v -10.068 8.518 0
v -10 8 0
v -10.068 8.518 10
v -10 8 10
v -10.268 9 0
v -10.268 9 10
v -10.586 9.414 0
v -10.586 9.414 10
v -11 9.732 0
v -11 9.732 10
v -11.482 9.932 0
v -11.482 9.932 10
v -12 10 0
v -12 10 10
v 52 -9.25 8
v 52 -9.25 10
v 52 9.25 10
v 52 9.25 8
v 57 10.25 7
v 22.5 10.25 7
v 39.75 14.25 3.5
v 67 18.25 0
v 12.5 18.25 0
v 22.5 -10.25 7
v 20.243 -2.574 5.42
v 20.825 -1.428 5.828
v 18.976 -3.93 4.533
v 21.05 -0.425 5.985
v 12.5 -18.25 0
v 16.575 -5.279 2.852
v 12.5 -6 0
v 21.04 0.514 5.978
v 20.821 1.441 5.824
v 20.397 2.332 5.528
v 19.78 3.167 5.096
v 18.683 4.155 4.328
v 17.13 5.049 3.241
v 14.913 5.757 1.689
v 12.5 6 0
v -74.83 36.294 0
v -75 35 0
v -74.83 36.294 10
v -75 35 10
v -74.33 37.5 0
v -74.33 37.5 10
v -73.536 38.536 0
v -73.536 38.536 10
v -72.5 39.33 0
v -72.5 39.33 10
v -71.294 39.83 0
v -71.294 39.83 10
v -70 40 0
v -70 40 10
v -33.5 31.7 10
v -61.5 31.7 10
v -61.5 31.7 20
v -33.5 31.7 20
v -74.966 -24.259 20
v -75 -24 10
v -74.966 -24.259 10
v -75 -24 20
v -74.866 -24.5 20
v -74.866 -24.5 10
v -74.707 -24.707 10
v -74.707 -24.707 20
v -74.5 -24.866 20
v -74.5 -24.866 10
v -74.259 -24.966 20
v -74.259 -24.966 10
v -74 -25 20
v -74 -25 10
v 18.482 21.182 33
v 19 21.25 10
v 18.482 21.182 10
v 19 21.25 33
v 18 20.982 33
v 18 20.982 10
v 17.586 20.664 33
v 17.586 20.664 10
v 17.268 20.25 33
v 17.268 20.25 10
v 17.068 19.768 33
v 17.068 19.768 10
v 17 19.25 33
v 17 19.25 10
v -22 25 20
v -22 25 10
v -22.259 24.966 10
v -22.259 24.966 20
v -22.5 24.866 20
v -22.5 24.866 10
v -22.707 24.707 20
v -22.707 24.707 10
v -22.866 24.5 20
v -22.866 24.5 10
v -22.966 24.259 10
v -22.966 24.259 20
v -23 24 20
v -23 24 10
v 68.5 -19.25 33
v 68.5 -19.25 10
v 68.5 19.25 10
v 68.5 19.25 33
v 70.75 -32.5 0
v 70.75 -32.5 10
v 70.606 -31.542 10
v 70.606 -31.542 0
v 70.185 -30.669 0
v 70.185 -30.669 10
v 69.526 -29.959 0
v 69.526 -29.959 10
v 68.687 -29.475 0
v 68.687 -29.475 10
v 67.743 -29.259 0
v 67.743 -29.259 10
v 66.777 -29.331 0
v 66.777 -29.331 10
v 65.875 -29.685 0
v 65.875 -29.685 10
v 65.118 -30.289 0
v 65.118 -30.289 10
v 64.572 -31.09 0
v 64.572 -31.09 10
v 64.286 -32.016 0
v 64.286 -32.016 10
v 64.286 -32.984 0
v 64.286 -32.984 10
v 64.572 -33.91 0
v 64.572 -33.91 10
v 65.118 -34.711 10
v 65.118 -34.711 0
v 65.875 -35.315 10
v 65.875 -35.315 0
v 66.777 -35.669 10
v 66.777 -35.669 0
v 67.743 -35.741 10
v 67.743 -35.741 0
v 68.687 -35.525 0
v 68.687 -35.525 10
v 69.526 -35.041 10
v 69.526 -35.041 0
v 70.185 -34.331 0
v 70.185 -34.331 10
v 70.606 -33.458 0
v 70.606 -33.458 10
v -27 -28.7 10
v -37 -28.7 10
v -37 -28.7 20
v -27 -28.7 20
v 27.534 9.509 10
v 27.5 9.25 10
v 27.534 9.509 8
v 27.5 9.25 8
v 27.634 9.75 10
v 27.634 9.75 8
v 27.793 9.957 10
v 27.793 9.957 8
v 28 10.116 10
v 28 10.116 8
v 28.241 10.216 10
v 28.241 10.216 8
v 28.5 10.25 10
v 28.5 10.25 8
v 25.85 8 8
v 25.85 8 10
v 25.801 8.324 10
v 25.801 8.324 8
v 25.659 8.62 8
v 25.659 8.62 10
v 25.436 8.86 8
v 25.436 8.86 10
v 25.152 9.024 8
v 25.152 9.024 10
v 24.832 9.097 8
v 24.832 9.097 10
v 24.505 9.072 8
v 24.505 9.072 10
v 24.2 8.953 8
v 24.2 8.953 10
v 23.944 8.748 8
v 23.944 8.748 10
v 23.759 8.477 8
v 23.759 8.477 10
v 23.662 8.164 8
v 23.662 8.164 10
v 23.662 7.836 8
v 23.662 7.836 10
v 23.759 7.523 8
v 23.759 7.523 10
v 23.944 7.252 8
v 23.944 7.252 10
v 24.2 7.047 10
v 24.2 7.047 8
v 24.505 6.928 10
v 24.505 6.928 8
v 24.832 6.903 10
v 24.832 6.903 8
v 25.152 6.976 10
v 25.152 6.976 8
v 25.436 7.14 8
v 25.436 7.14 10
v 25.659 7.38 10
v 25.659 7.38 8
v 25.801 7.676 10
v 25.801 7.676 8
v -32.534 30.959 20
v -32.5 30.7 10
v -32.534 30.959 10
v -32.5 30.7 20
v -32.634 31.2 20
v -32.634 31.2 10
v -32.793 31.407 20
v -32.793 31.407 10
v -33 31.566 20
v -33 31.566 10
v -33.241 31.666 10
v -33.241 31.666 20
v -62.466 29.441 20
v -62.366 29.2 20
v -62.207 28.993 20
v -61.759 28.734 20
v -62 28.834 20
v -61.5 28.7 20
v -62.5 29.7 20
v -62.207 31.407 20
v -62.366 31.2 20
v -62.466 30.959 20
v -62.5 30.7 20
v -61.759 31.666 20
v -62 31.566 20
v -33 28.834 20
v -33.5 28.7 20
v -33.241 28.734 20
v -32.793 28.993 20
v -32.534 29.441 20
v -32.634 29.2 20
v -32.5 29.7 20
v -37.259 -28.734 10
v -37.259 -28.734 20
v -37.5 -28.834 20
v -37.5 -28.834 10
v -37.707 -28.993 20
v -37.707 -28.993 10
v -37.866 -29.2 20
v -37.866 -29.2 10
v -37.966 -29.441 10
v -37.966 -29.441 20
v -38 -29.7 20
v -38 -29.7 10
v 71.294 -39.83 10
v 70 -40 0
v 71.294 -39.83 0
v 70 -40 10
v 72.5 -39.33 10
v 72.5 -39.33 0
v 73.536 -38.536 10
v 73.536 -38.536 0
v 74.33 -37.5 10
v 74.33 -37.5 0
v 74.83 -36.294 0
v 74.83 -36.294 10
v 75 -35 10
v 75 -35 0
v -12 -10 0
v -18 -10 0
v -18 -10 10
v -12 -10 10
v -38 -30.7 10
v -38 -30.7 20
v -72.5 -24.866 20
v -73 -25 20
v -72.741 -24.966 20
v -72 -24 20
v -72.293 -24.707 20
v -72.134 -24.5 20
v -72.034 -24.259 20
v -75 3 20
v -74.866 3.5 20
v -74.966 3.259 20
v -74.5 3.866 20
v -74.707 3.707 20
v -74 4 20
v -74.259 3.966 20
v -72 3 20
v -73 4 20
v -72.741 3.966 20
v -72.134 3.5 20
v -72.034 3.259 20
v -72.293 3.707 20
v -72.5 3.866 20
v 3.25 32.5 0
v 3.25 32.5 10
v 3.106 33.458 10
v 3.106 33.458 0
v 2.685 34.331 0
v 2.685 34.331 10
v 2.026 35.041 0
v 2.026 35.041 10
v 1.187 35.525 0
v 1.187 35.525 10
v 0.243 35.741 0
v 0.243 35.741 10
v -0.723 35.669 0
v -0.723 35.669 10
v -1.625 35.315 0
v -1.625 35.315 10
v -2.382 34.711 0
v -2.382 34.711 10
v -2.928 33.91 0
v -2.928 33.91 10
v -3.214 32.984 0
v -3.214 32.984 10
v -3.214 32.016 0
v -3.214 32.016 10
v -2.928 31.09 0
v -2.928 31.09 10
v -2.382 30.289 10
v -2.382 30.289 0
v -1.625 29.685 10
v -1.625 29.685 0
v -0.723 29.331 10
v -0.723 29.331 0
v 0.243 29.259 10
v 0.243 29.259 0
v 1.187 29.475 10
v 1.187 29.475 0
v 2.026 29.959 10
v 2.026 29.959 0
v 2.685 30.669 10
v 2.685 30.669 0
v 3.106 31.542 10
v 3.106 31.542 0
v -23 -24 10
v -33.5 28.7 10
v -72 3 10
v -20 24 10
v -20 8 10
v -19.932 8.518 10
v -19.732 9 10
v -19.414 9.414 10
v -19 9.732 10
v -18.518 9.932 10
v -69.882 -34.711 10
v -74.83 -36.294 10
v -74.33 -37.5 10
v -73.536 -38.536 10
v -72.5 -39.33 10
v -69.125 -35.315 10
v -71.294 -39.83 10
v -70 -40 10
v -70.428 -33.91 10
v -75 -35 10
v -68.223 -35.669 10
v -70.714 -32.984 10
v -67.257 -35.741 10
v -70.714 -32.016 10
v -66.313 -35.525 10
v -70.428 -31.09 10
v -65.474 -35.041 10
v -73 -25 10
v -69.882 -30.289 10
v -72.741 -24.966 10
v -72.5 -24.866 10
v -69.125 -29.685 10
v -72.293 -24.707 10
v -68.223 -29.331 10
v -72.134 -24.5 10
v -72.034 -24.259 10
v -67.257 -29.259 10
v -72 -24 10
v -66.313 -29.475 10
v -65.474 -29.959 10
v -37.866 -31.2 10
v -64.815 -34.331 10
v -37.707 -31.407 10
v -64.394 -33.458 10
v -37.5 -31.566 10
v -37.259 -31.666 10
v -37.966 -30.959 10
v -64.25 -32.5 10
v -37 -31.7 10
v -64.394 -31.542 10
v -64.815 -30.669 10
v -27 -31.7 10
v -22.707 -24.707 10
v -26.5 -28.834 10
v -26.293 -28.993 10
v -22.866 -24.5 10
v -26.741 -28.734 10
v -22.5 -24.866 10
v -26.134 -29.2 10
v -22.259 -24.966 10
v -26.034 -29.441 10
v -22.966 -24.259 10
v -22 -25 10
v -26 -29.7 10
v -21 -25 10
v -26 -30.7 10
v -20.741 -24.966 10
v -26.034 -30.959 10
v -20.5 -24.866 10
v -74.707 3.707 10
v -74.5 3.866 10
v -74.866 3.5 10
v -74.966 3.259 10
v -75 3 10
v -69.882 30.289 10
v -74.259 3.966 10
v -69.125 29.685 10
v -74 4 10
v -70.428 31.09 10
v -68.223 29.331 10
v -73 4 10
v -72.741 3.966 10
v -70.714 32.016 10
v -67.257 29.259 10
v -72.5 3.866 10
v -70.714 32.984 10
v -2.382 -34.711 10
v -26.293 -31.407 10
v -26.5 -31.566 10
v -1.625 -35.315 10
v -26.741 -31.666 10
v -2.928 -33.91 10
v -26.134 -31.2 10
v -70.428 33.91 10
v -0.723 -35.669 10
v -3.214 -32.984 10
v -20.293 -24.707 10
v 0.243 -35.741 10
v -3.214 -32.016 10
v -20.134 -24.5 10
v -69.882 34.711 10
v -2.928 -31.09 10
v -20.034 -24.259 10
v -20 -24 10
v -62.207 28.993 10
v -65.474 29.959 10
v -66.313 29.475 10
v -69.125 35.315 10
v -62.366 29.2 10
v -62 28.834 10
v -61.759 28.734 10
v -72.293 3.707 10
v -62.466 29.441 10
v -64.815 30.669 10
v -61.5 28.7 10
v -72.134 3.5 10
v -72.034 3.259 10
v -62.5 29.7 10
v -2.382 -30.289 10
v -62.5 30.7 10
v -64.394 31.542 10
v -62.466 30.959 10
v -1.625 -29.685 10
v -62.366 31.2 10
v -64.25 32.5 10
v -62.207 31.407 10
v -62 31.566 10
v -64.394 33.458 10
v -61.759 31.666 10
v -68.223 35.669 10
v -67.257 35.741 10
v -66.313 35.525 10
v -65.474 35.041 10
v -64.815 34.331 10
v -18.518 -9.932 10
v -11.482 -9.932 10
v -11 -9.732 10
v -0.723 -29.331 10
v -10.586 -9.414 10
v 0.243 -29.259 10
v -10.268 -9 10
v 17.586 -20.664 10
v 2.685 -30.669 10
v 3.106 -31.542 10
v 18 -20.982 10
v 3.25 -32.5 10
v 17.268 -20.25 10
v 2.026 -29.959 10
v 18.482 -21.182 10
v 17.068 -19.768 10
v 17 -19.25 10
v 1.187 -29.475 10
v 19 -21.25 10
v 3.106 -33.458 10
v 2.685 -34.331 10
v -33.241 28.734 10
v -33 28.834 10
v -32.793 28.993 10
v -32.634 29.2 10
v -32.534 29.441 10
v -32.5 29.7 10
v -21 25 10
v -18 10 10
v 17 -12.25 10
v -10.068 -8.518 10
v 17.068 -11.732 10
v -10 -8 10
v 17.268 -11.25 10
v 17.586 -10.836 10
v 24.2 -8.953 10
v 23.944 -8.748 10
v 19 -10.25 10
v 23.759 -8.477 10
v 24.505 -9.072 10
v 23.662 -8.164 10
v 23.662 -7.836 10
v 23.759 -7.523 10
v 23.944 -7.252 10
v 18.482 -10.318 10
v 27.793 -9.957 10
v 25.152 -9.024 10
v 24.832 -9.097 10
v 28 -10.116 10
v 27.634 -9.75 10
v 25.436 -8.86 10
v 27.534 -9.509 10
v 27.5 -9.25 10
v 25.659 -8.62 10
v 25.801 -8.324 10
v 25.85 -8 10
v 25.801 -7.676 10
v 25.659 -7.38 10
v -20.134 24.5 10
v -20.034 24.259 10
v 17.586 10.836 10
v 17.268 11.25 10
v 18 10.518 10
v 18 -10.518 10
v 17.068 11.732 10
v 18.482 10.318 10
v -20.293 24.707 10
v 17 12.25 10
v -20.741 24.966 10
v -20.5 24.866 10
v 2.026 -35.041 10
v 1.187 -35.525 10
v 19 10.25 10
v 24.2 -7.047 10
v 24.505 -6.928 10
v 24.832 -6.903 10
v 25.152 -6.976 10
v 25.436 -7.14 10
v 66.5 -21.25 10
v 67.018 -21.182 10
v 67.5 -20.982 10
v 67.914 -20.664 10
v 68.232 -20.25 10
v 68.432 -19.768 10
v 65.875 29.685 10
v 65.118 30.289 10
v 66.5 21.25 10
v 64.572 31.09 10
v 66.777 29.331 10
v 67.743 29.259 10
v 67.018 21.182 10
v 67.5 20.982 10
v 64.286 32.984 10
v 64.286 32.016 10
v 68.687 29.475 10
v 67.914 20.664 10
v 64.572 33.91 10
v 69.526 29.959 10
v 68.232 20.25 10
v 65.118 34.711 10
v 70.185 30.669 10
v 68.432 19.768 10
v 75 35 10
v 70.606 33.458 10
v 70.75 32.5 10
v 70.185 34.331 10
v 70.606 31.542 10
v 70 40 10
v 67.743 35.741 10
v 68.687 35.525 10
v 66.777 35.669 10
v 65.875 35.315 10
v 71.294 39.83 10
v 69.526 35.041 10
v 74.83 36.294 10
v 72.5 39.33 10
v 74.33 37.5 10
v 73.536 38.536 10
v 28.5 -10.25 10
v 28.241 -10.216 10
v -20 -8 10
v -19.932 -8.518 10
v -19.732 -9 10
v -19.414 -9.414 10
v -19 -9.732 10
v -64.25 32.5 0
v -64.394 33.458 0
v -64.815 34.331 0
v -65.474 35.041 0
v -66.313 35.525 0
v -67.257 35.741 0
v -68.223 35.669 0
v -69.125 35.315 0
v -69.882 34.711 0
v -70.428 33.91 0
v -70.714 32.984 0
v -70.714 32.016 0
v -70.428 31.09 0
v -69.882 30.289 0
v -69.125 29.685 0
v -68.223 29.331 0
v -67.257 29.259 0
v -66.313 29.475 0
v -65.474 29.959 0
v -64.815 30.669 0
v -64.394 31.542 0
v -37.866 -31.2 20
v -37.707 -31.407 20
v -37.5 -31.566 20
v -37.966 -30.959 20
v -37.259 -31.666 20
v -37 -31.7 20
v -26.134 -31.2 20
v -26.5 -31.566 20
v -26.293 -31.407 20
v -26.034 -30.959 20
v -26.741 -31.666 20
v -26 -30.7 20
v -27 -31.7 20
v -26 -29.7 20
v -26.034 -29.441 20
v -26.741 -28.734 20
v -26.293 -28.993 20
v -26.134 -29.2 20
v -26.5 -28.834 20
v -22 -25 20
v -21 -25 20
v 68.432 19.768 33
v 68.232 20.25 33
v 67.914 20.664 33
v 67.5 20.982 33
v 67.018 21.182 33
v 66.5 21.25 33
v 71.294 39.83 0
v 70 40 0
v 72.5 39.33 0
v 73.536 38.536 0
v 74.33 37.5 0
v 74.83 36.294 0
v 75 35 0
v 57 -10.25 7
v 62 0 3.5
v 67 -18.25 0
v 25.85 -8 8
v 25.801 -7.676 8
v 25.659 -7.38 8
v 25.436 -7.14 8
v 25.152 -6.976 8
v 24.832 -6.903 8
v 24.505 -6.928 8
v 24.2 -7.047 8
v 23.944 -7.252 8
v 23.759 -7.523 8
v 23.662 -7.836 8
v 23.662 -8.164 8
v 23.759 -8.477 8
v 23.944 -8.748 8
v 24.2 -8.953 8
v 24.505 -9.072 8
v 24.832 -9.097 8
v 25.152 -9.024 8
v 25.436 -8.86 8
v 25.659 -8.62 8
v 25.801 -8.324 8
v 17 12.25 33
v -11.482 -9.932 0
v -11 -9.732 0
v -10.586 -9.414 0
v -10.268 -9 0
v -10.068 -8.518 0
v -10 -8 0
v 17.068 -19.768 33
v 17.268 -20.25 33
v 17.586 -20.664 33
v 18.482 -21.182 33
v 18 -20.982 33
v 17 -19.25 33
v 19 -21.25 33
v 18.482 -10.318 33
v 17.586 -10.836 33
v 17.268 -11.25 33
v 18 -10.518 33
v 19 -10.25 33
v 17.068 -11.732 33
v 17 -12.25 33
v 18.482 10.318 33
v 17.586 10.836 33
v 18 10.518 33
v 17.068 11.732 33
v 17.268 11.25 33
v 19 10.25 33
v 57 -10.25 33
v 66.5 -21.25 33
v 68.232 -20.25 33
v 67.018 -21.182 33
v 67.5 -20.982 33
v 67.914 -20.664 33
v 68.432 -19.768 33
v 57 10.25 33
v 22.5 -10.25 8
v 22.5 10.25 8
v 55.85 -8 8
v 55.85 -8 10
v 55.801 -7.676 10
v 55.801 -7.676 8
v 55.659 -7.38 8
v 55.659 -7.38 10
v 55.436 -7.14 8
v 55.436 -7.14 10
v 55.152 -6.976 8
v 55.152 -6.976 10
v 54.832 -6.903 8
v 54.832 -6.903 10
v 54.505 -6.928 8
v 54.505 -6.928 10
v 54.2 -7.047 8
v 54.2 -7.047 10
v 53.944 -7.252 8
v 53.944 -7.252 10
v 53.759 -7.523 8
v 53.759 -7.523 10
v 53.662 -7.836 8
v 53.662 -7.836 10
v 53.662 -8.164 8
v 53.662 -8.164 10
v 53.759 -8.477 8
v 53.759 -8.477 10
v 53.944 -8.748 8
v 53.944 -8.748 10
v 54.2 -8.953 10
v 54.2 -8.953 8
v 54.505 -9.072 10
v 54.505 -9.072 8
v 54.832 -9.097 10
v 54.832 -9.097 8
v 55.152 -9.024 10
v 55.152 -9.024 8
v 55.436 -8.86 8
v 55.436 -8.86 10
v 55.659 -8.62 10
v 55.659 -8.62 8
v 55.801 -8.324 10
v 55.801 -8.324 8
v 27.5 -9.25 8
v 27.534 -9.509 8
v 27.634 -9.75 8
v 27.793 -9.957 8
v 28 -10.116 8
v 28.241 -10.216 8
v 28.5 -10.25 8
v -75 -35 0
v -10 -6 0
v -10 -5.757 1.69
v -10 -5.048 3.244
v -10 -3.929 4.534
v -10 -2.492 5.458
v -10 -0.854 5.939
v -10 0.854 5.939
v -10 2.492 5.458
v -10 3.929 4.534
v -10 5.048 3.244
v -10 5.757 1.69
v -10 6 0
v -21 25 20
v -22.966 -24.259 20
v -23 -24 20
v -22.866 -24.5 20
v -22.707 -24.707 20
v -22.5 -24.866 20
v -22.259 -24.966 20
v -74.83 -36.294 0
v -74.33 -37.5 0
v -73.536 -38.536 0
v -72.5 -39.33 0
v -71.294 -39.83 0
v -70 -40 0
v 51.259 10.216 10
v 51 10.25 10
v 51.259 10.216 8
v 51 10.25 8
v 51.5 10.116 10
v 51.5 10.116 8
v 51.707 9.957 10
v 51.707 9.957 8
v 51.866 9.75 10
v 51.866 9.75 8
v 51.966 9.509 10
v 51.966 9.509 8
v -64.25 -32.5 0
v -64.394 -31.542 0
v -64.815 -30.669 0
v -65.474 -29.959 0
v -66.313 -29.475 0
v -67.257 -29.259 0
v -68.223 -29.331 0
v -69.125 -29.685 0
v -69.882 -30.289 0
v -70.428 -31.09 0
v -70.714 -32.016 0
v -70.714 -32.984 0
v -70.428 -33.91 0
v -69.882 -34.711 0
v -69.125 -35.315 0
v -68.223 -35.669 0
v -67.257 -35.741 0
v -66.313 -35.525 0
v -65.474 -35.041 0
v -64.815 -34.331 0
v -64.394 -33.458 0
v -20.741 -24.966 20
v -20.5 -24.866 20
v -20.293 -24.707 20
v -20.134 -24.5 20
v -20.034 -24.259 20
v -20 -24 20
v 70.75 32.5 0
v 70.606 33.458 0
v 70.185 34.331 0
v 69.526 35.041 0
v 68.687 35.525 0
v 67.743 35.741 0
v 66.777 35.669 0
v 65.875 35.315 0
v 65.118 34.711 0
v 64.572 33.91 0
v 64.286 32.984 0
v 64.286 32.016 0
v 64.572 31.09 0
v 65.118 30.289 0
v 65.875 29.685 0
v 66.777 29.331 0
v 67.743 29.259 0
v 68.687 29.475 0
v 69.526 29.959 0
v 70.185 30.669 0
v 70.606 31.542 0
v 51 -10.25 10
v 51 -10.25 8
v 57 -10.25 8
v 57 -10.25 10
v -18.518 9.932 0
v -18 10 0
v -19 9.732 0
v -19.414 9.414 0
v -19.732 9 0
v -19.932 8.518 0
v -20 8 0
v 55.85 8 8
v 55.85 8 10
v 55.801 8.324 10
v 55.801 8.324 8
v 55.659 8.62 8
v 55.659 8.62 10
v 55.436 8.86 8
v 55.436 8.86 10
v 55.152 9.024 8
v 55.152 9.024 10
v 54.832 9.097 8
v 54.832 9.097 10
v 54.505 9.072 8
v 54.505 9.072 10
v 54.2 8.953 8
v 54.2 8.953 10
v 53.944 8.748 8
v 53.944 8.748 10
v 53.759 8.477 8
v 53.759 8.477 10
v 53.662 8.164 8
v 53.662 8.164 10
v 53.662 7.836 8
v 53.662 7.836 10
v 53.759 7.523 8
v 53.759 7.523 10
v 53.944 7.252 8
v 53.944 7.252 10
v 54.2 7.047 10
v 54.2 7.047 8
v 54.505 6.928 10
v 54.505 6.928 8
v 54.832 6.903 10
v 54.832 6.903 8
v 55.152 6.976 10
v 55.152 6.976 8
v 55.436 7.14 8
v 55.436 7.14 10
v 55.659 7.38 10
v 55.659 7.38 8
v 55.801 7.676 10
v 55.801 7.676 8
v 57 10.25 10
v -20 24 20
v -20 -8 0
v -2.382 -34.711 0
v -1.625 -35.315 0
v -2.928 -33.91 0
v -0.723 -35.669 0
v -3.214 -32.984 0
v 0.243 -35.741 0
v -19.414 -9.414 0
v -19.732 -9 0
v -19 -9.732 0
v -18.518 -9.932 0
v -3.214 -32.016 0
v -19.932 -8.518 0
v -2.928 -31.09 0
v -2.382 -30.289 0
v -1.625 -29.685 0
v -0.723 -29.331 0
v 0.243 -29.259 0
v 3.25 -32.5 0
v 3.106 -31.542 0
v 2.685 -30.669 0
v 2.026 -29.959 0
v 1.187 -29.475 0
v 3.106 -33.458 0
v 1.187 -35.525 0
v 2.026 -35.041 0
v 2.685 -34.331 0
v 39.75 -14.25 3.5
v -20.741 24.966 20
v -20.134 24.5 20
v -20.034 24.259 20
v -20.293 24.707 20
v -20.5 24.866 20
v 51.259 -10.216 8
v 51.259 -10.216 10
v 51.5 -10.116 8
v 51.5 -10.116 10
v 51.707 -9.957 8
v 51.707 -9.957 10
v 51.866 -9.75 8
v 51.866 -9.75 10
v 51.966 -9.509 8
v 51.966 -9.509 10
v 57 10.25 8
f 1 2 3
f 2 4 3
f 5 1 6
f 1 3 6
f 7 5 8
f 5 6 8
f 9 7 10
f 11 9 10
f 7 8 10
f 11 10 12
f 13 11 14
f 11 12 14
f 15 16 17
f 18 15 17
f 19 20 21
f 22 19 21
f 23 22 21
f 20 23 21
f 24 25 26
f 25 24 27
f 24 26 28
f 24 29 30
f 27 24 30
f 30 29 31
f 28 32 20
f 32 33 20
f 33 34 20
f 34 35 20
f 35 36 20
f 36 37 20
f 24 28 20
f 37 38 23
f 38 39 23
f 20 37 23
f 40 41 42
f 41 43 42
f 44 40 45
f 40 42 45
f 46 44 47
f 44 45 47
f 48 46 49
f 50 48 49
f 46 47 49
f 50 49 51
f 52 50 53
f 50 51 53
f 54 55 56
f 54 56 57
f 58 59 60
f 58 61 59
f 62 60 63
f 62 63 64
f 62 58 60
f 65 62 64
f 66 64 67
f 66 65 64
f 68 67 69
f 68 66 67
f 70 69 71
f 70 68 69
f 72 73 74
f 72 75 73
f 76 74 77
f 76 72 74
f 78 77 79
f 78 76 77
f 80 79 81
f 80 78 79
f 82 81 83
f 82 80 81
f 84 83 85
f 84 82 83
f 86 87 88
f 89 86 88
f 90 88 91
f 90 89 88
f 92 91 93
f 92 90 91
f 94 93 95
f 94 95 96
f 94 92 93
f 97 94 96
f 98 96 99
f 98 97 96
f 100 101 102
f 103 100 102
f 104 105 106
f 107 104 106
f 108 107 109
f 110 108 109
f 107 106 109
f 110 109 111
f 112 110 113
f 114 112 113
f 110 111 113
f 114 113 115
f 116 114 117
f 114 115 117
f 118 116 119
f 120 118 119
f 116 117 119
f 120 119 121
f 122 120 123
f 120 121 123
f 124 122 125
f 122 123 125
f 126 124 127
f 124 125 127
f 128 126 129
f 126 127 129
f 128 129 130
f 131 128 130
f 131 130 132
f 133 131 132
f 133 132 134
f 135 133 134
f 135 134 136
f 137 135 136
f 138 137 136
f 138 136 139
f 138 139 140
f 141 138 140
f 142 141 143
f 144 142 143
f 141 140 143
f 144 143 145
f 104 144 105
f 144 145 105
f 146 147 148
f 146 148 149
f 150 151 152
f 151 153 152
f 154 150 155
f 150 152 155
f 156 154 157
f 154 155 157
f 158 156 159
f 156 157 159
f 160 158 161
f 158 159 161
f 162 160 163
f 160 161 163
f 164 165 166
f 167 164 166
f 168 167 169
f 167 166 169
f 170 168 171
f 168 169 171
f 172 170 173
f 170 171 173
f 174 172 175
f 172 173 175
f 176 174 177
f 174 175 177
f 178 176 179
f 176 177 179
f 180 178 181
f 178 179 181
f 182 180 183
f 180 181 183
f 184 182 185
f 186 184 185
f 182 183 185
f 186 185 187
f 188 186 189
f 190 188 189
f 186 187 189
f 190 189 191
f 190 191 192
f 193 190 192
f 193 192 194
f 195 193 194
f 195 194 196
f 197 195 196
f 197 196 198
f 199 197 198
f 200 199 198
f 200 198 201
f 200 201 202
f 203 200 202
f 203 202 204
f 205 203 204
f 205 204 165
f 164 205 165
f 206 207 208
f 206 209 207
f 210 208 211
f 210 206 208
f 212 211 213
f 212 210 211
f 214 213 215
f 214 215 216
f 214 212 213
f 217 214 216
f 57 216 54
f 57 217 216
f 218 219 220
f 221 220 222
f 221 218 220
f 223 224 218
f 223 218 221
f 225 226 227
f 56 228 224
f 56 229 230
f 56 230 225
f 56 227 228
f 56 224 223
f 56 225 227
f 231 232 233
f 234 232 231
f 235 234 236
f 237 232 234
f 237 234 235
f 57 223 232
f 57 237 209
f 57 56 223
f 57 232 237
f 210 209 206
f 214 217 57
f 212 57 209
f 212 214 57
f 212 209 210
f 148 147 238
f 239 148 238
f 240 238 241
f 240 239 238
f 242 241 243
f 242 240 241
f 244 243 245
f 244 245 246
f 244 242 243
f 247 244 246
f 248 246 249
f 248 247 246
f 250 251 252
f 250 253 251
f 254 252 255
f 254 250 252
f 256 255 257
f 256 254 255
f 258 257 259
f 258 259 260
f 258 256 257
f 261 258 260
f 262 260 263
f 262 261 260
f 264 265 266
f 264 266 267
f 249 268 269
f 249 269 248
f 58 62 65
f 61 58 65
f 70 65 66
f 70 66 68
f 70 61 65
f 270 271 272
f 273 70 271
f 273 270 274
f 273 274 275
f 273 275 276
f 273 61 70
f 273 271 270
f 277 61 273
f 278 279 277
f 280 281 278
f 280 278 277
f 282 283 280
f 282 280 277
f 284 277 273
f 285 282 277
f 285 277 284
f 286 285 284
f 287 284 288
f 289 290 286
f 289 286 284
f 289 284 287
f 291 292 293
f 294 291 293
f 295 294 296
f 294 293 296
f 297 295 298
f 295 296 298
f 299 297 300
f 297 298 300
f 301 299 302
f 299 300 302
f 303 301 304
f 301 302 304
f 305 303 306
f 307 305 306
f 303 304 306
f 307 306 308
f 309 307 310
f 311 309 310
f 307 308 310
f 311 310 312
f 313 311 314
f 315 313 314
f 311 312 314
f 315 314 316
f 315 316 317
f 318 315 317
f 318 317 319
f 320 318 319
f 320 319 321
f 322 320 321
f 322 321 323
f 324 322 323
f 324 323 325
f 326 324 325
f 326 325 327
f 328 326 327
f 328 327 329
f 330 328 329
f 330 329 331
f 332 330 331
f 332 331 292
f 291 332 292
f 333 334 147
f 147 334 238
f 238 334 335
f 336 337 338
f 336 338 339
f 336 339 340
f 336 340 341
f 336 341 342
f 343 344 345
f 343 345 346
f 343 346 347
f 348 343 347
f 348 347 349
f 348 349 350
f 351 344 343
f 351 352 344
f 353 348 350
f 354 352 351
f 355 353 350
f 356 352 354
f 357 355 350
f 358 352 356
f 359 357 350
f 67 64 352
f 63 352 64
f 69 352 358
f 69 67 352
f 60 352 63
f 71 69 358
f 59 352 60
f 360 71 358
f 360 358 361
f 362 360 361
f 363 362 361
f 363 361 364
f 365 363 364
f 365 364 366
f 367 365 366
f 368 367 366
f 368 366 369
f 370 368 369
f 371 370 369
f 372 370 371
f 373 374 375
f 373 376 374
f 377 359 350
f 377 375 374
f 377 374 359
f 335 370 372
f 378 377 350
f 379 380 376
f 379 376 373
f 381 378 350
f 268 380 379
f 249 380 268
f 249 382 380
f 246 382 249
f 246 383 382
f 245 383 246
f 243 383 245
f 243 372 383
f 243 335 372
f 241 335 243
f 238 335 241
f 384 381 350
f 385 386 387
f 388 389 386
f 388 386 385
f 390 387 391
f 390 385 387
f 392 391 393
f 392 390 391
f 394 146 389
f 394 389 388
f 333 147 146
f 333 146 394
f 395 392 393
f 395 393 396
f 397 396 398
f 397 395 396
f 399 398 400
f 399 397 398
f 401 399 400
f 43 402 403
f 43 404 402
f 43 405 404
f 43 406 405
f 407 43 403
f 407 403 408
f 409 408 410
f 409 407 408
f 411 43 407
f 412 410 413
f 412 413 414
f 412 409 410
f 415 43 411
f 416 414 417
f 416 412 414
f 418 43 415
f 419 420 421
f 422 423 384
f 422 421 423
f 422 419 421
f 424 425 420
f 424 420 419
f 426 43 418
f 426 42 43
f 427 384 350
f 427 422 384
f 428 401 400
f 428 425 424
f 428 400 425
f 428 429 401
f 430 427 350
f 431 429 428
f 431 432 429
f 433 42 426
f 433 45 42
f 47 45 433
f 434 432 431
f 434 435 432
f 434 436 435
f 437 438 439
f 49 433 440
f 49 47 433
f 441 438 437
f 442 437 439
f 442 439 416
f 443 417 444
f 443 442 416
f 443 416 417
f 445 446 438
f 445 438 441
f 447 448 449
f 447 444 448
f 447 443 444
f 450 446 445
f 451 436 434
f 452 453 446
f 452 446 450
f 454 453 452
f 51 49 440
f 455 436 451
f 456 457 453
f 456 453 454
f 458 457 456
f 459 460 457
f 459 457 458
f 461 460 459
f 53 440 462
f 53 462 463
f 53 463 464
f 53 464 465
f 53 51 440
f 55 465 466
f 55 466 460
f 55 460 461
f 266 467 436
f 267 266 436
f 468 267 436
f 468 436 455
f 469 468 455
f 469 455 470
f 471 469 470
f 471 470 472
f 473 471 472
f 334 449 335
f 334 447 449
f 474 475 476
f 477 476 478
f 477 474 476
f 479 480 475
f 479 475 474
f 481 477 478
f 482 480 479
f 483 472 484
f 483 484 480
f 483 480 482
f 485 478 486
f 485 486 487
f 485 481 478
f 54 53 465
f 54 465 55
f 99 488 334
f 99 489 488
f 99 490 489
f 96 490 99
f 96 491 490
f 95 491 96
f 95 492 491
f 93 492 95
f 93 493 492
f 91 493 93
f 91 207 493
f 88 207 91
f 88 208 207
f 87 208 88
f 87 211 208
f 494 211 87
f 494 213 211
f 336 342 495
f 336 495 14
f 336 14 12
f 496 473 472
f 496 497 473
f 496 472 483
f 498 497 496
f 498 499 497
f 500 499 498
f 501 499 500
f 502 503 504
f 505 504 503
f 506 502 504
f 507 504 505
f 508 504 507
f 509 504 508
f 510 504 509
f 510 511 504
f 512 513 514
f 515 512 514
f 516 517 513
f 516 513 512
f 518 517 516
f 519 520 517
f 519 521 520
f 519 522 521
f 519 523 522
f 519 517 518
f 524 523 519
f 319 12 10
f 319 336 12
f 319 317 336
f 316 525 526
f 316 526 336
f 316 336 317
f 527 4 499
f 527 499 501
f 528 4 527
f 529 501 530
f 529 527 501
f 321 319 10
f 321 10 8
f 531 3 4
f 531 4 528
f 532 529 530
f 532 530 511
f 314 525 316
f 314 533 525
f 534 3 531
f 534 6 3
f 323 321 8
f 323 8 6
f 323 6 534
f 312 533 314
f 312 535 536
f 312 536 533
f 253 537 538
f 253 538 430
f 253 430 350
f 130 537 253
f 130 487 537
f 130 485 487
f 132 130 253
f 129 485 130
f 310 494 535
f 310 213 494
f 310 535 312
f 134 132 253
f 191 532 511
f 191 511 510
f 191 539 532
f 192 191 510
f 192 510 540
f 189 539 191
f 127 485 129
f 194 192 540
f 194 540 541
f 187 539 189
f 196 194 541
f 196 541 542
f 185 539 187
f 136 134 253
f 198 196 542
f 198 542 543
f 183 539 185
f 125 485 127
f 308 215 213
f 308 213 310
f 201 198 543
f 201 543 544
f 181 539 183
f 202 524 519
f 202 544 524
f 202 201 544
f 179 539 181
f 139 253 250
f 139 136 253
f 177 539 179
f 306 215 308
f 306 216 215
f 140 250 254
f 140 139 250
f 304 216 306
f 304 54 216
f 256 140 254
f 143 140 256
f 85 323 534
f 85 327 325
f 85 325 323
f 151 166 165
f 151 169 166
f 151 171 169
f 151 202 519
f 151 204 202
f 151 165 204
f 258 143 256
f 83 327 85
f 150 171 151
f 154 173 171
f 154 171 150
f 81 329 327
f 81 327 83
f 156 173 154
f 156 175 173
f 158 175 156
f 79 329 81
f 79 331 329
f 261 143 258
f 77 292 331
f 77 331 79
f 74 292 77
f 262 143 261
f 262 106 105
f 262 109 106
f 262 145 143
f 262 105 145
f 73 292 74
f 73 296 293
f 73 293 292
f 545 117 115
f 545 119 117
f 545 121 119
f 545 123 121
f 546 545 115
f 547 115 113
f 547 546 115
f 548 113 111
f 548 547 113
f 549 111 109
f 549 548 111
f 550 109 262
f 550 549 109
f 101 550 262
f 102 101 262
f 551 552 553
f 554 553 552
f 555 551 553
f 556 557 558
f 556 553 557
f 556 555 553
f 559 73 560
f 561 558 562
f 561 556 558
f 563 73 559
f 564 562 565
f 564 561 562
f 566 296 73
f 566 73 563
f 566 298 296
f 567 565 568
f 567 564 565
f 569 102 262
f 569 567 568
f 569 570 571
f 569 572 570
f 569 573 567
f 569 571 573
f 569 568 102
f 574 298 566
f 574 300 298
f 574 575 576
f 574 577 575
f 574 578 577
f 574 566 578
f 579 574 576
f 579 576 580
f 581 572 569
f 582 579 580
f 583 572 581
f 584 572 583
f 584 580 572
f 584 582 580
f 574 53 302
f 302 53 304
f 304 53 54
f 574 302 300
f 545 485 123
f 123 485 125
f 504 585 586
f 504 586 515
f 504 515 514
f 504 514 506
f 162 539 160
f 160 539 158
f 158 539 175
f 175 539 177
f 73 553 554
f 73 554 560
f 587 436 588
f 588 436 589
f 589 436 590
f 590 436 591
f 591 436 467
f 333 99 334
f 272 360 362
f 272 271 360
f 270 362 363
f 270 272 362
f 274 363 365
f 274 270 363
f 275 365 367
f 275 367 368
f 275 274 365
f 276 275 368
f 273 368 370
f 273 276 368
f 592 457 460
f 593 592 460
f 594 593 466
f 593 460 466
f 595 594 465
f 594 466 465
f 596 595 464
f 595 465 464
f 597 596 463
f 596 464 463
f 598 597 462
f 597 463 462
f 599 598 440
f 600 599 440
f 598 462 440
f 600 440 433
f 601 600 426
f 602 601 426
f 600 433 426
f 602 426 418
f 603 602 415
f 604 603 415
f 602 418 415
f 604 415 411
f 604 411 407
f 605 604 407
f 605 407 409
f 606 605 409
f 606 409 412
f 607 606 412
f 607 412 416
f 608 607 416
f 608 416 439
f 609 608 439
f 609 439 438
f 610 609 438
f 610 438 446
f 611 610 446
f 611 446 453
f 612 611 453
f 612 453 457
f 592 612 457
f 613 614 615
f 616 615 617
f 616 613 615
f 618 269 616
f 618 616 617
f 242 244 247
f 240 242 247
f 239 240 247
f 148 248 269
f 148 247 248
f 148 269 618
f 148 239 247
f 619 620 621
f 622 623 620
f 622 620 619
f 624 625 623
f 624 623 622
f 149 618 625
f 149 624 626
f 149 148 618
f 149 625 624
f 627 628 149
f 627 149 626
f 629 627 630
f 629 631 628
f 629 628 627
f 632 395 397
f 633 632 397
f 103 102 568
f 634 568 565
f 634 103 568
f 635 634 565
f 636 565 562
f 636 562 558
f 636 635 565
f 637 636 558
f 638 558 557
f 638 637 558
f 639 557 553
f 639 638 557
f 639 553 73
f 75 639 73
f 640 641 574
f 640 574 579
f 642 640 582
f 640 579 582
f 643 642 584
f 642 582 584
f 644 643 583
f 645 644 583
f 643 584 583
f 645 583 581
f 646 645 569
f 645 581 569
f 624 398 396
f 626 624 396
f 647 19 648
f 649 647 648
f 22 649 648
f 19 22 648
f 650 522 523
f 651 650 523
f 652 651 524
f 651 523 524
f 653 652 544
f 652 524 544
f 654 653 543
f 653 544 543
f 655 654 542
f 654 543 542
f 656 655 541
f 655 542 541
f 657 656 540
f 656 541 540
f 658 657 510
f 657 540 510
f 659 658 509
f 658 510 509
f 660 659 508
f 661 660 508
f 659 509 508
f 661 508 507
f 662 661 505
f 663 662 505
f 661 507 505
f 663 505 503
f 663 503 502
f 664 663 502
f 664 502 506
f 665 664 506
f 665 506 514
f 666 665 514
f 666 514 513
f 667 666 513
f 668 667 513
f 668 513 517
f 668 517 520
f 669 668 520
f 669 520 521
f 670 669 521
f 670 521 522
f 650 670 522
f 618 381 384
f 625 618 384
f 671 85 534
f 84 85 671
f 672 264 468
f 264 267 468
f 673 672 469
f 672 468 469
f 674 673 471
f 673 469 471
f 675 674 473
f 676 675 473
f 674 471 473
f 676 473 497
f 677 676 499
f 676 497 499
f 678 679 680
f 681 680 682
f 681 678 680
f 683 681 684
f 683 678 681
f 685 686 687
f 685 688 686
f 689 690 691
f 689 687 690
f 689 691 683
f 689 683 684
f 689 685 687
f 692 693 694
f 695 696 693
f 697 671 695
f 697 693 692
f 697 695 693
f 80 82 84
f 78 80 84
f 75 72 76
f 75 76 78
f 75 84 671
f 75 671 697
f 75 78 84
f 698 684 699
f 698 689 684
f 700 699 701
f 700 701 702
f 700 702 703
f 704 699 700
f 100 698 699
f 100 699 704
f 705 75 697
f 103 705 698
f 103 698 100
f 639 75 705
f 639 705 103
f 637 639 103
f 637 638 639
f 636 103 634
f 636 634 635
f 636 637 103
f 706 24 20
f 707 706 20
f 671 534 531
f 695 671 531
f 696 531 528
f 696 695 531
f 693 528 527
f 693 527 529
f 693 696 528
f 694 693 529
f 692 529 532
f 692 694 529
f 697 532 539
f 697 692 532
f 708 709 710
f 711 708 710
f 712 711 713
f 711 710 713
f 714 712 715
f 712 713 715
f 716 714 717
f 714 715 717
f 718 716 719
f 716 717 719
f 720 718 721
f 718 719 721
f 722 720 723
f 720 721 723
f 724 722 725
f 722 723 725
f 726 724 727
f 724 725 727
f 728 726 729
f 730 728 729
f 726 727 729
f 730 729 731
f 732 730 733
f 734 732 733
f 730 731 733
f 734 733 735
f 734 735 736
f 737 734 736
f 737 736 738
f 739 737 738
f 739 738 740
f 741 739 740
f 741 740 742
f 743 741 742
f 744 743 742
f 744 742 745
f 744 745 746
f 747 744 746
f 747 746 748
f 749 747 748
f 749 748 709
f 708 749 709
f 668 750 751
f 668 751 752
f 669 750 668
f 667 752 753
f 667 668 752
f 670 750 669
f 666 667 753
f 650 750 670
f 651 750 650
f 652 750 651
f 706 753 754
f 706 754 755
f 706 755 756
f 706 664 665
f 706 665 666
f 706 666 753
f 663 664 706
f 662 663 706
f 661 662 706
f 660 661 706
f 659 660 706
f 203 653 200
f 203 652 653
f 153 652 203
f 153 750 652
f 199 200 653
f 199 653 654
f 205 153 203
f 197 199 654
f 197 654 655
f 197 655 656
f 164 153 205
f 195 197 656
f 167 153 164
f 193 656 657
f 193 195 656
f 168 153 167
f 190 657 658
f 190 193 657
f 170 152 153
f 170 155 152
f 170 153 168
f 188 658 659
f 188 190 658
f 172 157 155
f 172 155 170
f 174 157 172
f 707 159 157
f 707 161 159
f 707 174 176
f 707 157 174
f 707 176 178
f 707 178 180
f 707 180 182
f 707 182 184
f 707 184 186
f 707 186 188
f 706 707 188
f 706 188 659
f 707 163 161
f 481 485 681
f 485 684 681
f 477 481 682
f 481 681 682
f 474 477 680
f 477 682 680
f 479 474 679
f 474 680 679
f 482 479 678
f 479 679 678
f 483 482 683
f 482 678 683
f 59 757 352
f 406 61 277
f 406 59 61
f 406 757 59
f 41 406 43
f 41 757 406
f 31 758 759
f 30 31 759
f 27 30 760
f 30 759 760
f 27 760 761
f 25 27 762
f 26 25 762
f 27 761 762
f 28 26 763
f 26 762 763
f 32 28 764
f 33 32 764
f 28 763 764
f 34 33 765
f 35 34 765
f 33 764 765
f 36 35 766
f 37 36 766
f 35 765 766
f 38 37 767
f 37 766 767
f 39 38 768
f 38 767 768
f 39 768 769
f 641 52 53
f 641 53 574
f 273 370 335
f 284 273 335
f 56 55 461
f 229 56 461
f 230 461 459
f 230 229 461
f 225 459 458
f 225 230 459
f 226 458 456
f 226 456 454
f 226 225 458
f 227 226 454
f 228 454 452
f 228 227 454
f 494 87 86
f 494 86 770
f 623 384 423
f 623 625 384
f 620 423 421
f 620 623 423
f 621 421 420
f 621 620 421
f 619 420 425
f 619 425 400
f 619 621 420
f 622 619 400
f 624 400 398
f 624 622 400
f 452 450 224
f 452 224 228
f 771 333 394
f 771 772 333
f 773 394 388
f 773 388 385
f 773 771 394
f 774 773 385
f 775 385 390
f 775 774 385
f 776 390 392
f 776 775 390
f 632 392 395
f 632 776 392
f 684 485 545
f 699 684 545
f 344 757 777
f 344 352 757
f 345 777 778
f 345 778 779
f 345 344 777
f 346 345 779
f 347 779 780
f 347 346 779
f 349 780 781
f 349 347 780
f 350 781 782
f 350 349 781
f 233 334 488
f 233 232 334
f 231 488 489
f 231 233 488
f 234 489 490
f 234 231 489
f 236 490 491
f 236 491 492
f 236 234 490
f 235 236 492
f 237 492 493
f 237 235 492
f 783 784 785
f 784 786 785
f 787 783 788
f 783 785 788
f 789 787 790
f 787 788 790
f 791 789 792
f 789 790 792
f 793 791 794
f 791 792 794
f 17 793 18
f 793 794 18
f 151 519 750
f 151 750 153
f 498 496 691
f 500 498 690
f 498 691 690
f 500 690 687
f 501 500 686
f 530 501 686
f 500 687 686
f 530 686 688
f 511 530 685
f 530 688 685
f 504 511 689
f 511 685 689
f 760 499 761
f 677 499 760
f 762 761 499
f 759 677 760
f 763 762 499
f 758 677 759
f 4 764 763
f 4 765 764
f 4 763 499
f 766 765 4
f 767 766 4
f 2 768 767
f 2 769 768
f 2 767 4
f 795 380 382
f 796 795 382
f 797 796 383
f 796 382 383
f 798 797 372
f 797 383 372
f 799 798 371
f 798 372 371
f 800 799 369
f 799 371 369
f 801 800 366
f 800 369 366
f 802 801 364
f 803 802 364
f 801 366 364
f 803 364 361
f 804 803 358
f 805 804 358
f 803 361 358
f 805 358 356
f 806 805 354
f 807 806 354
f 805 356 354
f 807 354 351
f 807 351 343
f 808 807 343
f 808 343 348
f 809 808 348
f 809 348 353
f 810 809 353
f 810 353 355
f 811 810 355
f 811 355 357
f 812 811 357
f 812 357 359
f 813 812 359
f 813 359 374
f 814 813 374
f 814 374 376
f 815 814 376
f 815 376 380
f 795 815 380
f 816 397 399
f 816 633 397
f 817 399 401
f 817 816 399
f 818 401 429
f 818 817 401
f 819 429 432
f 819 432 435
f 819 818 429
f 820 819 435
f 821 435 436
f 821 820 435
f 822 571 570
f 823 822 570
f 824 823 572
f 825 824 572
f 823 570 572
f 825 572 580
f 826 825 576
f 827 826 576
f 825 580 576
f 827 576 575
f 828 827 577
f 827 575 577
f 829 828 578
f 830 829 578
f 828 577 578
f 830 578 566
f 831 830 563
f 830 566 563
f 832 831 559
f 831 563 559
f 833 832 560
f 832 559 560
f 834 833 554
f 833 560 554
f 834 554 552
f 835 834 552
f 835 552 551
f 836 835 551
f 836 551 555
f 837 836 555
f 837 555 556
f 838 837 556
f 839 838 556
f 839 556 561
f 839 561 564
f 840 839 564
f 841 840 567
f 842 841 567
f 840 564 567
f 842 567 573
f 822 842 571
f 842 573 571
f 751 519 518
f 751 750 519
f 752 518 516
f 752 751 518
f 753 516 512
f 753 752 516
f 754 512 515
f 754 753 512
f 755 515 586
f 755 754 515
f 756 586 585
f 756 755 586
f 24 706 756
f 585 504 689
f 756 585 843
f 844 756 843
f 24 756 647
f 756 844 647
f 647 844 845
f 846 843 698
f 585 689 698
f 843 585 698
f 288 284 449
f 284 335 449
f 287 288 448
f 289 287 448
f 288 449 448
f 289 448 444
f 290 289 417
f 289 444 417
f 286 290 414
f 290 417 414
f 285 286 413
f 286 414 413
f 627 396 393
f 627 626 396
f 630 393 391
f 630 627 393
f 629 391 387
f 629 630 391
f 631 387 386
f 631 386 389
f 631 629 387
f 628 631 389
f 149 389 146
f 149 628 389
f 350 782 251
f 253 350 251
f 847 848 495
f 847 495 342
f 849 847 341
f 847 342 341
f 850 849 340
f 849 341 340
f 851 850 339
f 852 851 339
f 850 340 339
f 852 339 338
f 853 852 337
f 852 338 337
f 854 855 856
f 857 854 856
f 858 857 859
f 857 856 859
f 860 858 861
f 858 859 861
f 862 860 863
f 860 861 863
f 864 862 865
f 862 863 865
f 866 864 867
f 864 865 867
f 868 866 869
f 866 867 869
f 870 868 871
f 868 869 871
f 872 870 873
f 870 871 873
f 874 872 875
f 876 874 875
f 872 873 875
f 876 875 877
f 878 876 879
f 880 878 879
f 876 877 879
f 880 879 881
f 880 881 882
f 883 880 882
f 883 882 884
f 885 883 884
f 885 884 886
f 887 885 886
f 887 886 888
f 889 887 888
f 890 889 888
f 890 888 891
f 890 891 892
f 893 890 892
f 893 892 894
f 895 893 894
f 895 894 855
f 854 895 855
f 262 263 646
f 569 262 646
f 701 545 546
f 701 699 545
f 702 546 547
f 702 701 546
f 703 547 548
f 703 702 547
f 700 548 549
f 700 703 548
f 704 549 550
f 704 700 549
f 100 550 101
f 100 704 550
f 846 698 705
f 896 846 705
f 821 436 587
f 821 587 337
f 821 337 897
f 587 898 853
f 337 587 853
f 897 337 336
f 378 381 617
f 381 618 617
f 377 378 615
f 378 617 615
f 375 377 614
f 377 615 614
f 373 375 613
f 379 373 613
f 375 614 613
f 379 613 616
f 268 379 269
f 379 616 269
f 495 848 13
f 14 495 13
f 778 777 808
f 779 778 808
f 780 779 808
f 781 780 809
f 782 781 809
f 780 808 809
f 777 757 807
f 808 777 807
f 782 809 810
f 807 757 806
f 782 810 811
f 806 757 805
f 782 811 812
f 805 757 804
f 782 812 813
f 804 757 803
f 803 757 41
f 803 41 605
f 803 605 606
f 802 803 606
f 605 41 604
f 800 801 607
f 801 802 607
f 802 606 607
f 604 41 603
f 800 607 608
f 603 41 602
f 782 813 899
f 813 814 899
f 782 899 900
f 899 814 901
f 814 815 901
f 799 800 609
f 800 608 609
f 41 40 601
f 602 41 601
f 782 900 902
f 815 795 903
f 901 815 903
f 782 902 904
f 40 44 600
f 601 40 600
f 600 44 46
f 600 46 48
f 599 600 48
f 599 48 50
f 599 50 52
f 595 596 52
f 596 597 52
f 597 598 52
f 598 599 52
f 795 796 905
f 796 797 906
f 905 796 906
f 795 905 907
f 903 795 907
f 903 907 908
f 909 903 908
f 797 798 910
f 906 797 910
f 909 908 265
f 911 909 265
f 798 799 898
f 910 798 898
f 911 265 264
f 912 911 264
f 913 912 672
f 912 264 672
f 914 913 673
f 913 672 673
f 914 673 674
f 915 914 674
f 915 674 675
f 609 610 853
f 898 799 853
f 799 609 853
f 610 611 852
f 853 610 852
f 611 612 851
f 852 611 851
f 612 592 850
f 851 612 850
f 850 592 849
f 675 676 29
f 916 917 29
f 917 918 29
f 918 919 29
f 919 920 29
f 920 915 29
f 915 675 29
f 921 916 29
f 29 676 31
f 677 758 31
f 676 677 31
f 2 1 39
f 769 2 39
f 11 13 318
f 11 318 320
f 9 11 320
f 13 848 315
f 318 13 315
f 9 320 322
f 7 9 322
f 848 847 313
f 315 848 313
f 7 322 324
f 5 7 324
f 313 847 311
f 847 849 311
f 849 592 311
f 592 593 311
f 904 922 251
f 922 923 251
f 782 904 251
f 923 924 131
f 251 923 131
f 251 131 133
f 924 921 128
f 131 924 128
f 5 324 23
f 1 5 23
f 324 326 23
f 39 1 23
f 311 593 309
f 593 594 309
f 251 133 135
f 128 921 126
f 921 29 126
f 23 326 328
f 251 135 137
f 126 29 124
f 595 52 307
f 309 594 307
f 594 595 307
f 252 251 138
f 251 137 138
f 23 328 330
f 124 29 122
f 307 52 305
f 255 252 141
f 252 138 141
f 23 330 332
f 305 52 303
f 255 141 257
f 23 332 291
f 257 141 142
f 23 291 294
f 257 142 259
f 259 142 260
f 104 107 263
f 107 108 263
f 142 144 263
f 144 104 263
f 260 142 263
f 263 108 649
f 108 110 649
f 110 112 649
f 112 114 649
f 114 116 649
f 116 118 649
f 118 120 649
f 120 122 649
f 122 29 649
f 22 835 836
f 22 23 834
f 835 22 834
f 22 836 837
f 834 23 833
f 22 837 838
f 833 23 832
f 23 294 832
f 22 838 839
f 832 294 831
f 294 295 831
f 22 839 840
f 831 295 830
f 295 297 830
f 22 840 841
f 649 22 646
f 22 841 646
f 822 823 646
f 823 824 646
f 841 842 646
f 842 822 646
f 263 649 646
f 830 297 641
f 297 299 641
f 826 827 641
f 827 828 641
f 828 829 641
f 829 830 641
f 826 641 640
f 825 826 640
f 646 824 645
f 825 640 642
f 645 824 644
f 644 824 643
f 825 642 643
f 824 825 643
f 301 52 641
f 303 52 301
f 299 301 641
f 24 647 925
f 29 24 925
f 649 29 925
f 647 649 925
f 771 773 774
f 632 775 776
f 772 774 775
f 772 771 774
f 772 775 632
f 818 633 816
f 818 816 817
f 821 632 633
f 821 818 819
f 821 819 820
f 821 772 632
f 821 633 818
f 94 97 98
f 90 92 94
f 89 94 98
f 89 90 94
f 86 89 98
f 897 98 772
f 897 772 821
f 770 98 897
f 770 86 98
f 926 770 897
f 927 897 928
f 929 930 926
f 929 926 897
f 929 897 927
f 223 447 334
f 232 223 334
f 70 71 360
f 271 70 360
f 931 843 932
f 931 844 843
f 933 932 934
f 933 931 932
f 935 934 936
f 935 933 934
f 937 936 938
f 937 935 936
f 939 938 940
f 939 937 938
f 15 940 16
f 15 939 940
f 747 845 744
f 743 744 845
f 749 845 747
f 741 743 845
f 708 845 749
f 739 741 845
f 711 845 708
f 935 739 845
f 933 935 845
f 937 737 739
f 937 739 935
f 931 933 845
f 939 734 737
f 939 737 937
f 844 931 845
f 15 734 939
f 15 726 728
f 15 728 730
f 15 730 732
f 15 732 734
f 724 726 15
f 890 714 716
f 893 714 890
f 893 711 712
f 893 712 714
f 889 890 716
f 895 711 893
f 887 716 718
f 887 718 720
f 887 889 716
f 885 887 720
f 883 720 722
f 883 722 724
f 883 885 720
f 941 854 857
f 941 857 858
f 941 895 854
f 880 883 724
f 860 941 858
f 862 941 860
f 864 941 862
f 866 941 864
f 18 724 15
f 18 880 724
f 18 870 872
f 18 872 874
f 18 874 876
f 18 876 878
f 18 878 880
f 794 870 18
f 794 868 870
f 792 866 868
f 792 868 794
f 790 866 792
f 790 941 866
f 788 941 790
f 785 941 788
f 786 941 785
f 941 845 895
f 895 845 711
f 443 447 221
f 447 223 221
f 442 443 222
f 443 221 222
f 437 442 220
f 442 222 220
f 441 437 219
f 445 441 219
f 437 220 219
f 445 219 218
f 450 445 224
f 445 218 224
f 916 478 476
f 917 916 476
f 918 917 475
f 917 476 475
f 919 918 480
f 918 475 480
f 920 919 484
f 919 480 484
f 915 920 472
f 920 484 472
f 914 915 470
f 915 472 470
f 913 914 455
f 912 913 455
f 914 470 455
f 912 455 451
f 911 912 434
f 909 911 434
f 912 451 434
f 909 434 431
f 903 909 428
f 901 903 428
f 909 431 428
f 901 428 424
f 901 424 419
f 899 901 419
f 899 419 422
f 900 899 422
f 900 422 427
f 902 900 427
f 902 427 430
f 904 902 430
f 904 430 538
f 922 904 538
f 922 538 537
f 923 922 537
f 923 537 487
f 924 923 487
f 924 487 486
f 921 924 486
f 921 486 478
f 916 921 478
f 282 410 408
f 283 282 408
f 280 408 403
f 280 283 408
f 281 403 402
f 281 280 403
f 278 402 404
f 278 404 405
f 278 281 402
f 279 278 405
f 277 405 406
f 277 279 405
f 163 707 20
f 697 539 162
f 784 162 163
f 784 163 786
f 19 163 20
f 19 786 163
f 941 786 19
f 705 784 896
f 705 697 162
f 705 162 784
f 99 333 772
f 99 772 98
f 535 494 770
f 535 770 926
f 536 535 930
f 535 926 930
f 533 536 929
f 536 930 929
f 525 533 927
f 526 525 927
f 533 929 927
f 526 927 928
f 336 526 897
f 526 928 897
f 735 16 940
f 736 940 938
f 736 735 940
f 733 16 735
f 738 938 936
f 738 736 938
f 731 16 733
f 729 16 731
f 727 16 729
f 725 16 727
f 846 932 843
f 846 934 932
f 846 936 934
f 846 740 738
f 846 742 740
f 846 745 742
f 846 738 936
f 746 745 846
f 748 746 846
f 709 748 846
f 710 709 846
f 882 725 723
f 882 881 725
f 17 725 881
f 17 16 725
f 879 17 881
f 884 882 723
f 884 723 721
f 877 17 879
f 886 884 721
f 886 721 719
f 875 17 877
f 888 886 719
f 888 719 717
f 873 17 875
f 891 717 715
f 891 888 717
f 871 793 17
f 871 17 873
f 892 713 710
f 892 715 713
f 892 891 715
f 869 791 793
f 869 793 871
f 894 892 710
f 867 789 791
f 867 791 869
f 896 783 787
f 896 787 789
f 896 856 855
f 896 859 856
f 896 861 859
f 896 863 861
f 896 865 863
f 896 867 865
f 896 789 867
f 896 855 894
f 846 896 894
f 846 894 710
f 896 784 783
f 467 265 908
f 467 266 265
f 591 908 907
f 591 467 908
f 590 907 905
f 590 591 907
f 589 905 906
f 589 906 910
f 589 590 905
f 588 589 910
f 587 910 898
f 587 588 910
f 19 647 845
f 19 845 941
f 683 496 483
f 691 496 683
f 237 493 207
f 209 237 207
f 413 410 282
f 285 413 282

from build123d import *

# Parameters (mm, degrees)
SKETCH1_W            = 150
SKETCH1_H            = 80
SKETCH1_W_2          = 10
SKETCH1_H_2          = 20
BOSS_EXTRUDE1_DEPTH  = 10
FILLET1_R            = 2
FILLET2_R            = 5
BOSS_EXTRUDE2_DEPTH  = 23
SKETCH2_3_W          = 34.5
SKETCH2_3_H          = 20.5
CUT_EXTRUDE1_DEPTH   = 10
SKETCH3_W            = 5
SKETCH3_H            = 20.5
SKETCH3_R            = 1.1
BOSS_EXTRUDE3_DEPTH  = 3
CUT_EXTRUDE2_REACH   = 101.569
SKETCH7_W            = 5
SKETCH7_H            = 20.5
CUT_EXTRUDE3_DEPTH   = 1
SKETCH14_W           = 23
SKETCH14_H           = 11
CUT_EXTRUDE4_DEPTH   = 6
FILLET4_R            = 1
SKETCH15_R           = 3.25
CUT_EXTRUDE5_DEPTH   = 10
BOSS_EXTRUDE8_DEPTH  = 15
SKETCH16_3_W         = 19
SKETCH16_3_H         = 5
BOSS_EXTRUDE9_DEPTH  = 5
SKETCH17_R           = 1.7
CUT_EXTRUDE6_DEPTH   = 4
FILLET10_R           = 2
FILLET11_R           = 2
SKETCH18_W           = 67.5
SKETCH18_H           = 65
CUT_EXTRUDE7_DEPTH   = 89.056799851
SKETCH20_W           = 3
SKETCH20_H           = 50
BOSS_EXTRUDE11_DEPTH = 10
FILLET13_R           = 1
FILLET14_R           = 1
CUT_EXTRUDE8_REACH   = 160.71
SKETCH21_W           = 10
SKETCH21_H           = 30
FILLET15_R           = 1
SKETCH22_W           = 30
SKETCH22_H           = 3
SKETCH22_W_2         = 12
BOSS_EXTRUDE12_DEPTH = 10
FILLET16_R           = 1
FILLET17_R           = 1
FILLET18_R           = 2


with BuildPart() as part:
    # Sketch1 → Boss-Extrude1 (new body)
    with BuildSketch(Plane.XY):
        Rectangle(SKETCH1_W, SKETCH1_H)
        with Locations((-15, 0)):
            Rectangle(SKETCH1_W_2, SKETCH1_H_2, mode=Mode.SUBTRACT)
    extrude(amount=BOSS_EXTRUDE1_DEPTH)

    # Fillet1
    fillet1_edges = [part.edges().sort_by_distance(p)[0] for p in [
        (-10, -10, 5),
        (-10, 10, 5),
        (-20, 10, 5),
        (-20, -10, 5),
    ]]
    fillet(fillet1_edges, radius=FILLET1_R)

    # Fillet2
    fillet2_edges = [part.edges().sort_by_distance(p)[0] for p in [
        (75, -40, 5),
        (-75, -40, 5),
        (-75, 40, 5),
        (75, 40, 5),
    ]]
    fillet(fillet2_edges, radius=FILLET2_R)

    # Sketch2 → Boss-Extrude2 (add)
    with BuildSketch(Plane.XY.offset(10)):
        Polygon((57, 10.25), (57, -10.25), (22.5, -10.25), (11, -10.25), (11, -21.25), (68.5, -21.25), (68.5, 21.25), (11, 21.25), (11, 10.25), (22.5, 10.25), align=None)
    extrude(amount=BOSS_EXTRUDE2_DEPTH)

    # Sketch2<3> → Cut-Extrude1 (cut)
    with BuildSketch(Plane.XY.offset(10)):
        with Locations((39.75, 0)):
            Rectangle(SKETCH2_3_W, SKETCH2_3_H)
    extrude(amount=-CUT_EXTRUDE1_DEPTH, mode=Mode.SUBTRACT)

    # Sketch3 → Boss-Extrude3 (add)
    # profile 1 of 2: a face of its own
    with BuildSketch(Plane.XY.offset(10)):
        with Locations((25, 0)):
            Rectangle(SKETCH3_W, SKETCH3_H)
        with Locations((24.75, 8)):
            Circle(SKETCH3_R, mode=Mode.SUBTRACT)
        with Locations((24.75, -8)):
            Circle(SKETCH3_R, mode=Mode.SUBTRACT)
    # profile 2 of 2: a face of its own
    with BuildSketch(Plane.XY.offset(10)):
        with Locations((54.5, 0)):
            Rectangle(SKETCH3_W, SKETCH3_H)
        with Locations((54.75, 8)):
            Circle(SKETCH3_R, mode=Mode.SUBTRACT)
        with Locations((54.75, -8)):
            Circle(SKETCH3_R, mode=Mode.SUBTRACT)
    extrude(amount=-BOSS_EXTRUDE3_DEPTH)

    # Sketch4 → Cut-Loft2 section 0
    with BuildSketch(Plane(origin=(0, 0, 7), x_dir=(-1, 0, 0), z_dir=(0, 0, -1))):
        with BuildLine():
            Line((-22.5, 10.25), (-57, 10.25))
            Line((-57, 10.25), (-57, -10.25))
            Line((-57, -10.25), (-22.5, -10.25))
            Line((-22.5, -10.25), (-22.5, 10.25))
        make_face()
    # Sketch5 → Cut-Loft2 section 1
    with BuildSketch(Plane(origin=(0, 0, 0), x_dir=(-1, 0, 0), z_dir=(0, 0, -1))):
        with BuildLine():
            Line((-67, -18.25), (-12.5, -18.25))
            Line((-12.5, -18.25), (-12.5, 18.25))
            Line((-12.5, 18.25), (-67, 18.25))
            Line((-67, 18.25), (-67, -18.25))
        make_face()
    loft(mode=Mode.SUBTRACT)

    # Cut-Extrude2: up to this plane
    cut_extrude2_end = Plane(origin=(4.110738255, 0, -5.872483221), z_dir=(-0.5734623443633287, 0, 0.8192319205190403))
    # Sketch6 → Cut-Extrude2 (cut, up to the surface)
    with BuildSketch(Plane.ZY.offset(10), mode=Mode.PRIVATE) as cut_extrude2_sk1:
        with BuildLine():
            Line((0, 6), (0, -6))
            ThreePointArc((0, -6), (6, 0), (0, 6))
        make_face()
    cut_extrude2_tool1 = split(extrude(cut_extrude2_sk1.sketch, amount=-CUT_EXTRUDE2_REACH, mode=Mode.PRIVATE), bisect_by=cut_extrude2_end, keep=Keep.BOTH, mode=Mode.PRIVATE)
    add(cut_extrude2_tool1.solids().sort_by_distance((-10, 0, 2.546479))[0], mode=Mode.SUBTRACT)

    # Sketch7 → Cut-Extrude3 (cut)
    with BuildSketch(Plane(origin=(0, 0, 7), x_dir=(-1, 0, 0), z_dir=(0, 0, -1))):
        with Locations((-54.5, 0)):
            Rectangle(SKETCH7_W, SKETCH7_H)
        with Locations((-25, 0)):
            Rectangle(SKETCH7_W, SKETCH7_H)
    extrude(amount=-CUT_EXTRUDE3_DEPTH, mode=Mode.SUBTRACT)

    # Sketch14 → Cut-Extrude4 (cut)
    with BuildSketch(Plane.ZY.offset(-11)):
        with Locations((21.5, -15.75)):
            Rectangle(SKETCH14_W, SKETCH14_H)
        with Locations((21.5, 15.75)):
            Rectangle(SKETCH14_W, SKETCH14_H)
    extrude(amount=-CUT_EXTRUDE4_DEPTH, mode=Mode.SUBTRACT)

    # Fillet4
    fillet4_edges = [part.edges().sort_by_distance(p)[0] for p in [
        (52, 10.25, 9),
        (52, -10.25, 9),
        (27.5, -10.25, 9),
        (27.5, 10.25, 9),
    ]]
    fillet(fillet4_edges, radius=FILLET4_R)

    # Sketch15 → Cut-Extrude5 (cut)
    with BuildSketch(Plane.XY.offset(10)):
        with Locations((-67.5, 32.5)):
            Circle(SKETCH15_R)
        with Locations((0, 32.5)):
            Circle(SKETCH15_R)
        with Locations((67.5, 32.5)):
            Circle(SKETCH15_R)
        with Locations((67.5, -32.5)):
            Circle(SKETCH15_R)
        with Locations((0, -32.5)):
            Circle(SKETCH15_R)
        with Locations((-67.5, -32.5)):
            Circle(SKETCH15_R)
    extrude(amount=-CUT_EXTRUDE5_DEPTH, mode=Mode.SUBTRACT)

    # Sketch16 → Boss-Extrude8 (add)
    with BuildSketch(Plane.XY.offset(10)):
        Polygon((-49, -24.05), (-49, 24.05), (-30, 24.05), (-30, -24.05), (-30, -29.05), (-25, -29.05), (-25, 29.05), (-54, 29.05), (-54, -29.05), (-49, -29.05), align=None)
    extrude(amount=BOSS_EXTRUDE8_DEPTH)

    # Sketch16<3> → Boss-Extrude9 (add)
    with BuildSketch(Plane.XY.offset(10)):
        with Locations((-39.5, -26.55)):
            Rectangle(SKETCH16_3_W, SKETCH16_3_H)
    extrude(amount=BOSS_EXTRUDE9_DEPTH)

    # Sketch17 → Cut-Extrude6 (cut)
    with BuildSketch(Plane.XY.offset(25)):
        with Locations((-27.5, 3.05)):
            Circle(SKETCH17_R)
        with Locations((-51.5, -6.95)):
            Circle(SKETCH17_R)
    extrude(amount=-CUT_EXTRUDE6_DEPTH, mode=Mode.SUBTRACT)

    # Fillet10
    fillet10_edges = [part.edges().sort_by_distance(p)[0] for p in [
        (-30, -26.55, 15),
        (-49, -26.55, 15),
    ]]
    fillet(fillet10_edges, radius=FILLET10_R)

    # Fillet11
    fillet11_edges = [part.edges().sort_by_distance(p)[0] for p in [
        (-39.5, -29.05, 10),
        (-25, -29.05, 17.5),
        (-25, 29.05, 17.5),
        (-54, 0, 10),
        (-54, 29.05, 17.5),
        (-54, -29.05, 17.5),
        (-39.5, 29.05, 10),
        (-25, 0, 10),
    ]]
    fillet(fillet11_edges, radius=FILLET11_R)

    # Sketch18 → Cut-Extrude7 (cut, through all)
    with BuildSketch(Plane.XY.offset(10)):
        with Locations((-33.75, 0)):
            Rectangle(SKETCH18_W, SKETCH18_H)
    extrude(amount=CUT_EXTRUDE7_DEPTH, mode=Mode.SUBTRACT)

    # Sketch20 → Boss-Extrude11 (add)
    with BuildSketch(Plane.XY.offset(10)):
        with Locations((-73.5, 0)):
            Rectangle(SKETCH20_W, SKETCH20_H)
        with Locations((-21.5, 0)):
            Rectangle(SKETCH20_W, SKETCH20_H)
    extrude(amount=BOSS_EXTRUDE11_DEPTH)

    # Fillet13
    fillet13_edges = [part.edges().sort_by_distance(p)[0] for p in [
        (-75, 25, 15),
        (-75, -25, 15),
        (-72, -25, 15),
        (-72, 25, 15),
    ]]
    fillet(fillet13_edges, radius=FILLET13_R)

    # Fillet14
    fillet14_edges = [part.edges().sort_by_distance(p)[0] for p in [
        (-23, 25, 15),
        (-23, -25, 15),
        (-20, -25, 15),
        (-20, 25, 15),
    ]]
    fillet(fillet14_edges, radius=FILLET14_R)

    # Sketch21 → Cut-Extrude8 (cut, up to next)
    with BuildSketch(Plane.ZY.offset(75), mode=Mode.PRIVATE) as cut_extrude8_sk1:
        with Locations((15, 19)):
            Rectangle(SKETCH21_W, SKETCH21_H)
    cut_extrude8_tool1 = extrude(cut_extrude8_sk1.sketch, amount=-CUT_EXTRUDE8_REACH, mode=Mode.PRIVATE) & part.part
    add(cut_extrude8_tool1.solids().sort_by_distance((-75, 19, 15))[0], mode=Mode.SUBTRACT)

    # Fillet15
    fillet15_edges = [part.edges().sort_by_distance(p)[0] for p in [
        (-75, 4, 15),
        (-72, 4, 15),
    ]]
    fillet(fillet15_edges, radius=FILLET15_R)

    # Sketch22 → Boss-Extrude12 (add)
    with BuildSketch(Plane.XY.offset(10)):
        with Locations((-47.5, 30.2)):
            Rectangle(SKETCH22_W, SKETCH22_H)
        with Locations((-32, -30.2)):
            Rectangle(SKETCH22_W_2, SKETCH22_H)
    extrude(amount=BOSS_EXTRUDE12_DEPTH)

    # Fillet16
    fillet16_edges = [part.edges().sort_by_distance(p)[0] for p in [
        (-62.5, 31.7, 15),
        (-62.5, 28.7, 15),
        (-32.5, 28.7, 15),
        (-32.5, 31.7, 15),
    ]]
    fillet(fillet16_edges, radius=FILLET16_R)

    # Fillet17
    fillet17_edges = [part.edges().sort_by_distance(p)[0] for p in [
        (-38, -28.7, 15),
        (-38, -31.7, 15),
        (-26, -31.7, 15),
        (-26, -28.7, 15),
    ]]
    fillet(fillet17_edges, radius=FILLET17_R)

    # Fillet18
    fillet18_edges = [part.edges().sort_by_distance(p)[0] for p in [
        (17, -10.25, 21.5),
        (17, -21.25, 21.5),
        (17, 21.25, 21.5),
        (17, 10.25, 21.5),
        (68.5, -21.25, 21.5),
        (68.5, 21.25, 21.5),
    ]]
    fillet(fillet18_edges, radius=FILLET18_R)


solid = part.part
